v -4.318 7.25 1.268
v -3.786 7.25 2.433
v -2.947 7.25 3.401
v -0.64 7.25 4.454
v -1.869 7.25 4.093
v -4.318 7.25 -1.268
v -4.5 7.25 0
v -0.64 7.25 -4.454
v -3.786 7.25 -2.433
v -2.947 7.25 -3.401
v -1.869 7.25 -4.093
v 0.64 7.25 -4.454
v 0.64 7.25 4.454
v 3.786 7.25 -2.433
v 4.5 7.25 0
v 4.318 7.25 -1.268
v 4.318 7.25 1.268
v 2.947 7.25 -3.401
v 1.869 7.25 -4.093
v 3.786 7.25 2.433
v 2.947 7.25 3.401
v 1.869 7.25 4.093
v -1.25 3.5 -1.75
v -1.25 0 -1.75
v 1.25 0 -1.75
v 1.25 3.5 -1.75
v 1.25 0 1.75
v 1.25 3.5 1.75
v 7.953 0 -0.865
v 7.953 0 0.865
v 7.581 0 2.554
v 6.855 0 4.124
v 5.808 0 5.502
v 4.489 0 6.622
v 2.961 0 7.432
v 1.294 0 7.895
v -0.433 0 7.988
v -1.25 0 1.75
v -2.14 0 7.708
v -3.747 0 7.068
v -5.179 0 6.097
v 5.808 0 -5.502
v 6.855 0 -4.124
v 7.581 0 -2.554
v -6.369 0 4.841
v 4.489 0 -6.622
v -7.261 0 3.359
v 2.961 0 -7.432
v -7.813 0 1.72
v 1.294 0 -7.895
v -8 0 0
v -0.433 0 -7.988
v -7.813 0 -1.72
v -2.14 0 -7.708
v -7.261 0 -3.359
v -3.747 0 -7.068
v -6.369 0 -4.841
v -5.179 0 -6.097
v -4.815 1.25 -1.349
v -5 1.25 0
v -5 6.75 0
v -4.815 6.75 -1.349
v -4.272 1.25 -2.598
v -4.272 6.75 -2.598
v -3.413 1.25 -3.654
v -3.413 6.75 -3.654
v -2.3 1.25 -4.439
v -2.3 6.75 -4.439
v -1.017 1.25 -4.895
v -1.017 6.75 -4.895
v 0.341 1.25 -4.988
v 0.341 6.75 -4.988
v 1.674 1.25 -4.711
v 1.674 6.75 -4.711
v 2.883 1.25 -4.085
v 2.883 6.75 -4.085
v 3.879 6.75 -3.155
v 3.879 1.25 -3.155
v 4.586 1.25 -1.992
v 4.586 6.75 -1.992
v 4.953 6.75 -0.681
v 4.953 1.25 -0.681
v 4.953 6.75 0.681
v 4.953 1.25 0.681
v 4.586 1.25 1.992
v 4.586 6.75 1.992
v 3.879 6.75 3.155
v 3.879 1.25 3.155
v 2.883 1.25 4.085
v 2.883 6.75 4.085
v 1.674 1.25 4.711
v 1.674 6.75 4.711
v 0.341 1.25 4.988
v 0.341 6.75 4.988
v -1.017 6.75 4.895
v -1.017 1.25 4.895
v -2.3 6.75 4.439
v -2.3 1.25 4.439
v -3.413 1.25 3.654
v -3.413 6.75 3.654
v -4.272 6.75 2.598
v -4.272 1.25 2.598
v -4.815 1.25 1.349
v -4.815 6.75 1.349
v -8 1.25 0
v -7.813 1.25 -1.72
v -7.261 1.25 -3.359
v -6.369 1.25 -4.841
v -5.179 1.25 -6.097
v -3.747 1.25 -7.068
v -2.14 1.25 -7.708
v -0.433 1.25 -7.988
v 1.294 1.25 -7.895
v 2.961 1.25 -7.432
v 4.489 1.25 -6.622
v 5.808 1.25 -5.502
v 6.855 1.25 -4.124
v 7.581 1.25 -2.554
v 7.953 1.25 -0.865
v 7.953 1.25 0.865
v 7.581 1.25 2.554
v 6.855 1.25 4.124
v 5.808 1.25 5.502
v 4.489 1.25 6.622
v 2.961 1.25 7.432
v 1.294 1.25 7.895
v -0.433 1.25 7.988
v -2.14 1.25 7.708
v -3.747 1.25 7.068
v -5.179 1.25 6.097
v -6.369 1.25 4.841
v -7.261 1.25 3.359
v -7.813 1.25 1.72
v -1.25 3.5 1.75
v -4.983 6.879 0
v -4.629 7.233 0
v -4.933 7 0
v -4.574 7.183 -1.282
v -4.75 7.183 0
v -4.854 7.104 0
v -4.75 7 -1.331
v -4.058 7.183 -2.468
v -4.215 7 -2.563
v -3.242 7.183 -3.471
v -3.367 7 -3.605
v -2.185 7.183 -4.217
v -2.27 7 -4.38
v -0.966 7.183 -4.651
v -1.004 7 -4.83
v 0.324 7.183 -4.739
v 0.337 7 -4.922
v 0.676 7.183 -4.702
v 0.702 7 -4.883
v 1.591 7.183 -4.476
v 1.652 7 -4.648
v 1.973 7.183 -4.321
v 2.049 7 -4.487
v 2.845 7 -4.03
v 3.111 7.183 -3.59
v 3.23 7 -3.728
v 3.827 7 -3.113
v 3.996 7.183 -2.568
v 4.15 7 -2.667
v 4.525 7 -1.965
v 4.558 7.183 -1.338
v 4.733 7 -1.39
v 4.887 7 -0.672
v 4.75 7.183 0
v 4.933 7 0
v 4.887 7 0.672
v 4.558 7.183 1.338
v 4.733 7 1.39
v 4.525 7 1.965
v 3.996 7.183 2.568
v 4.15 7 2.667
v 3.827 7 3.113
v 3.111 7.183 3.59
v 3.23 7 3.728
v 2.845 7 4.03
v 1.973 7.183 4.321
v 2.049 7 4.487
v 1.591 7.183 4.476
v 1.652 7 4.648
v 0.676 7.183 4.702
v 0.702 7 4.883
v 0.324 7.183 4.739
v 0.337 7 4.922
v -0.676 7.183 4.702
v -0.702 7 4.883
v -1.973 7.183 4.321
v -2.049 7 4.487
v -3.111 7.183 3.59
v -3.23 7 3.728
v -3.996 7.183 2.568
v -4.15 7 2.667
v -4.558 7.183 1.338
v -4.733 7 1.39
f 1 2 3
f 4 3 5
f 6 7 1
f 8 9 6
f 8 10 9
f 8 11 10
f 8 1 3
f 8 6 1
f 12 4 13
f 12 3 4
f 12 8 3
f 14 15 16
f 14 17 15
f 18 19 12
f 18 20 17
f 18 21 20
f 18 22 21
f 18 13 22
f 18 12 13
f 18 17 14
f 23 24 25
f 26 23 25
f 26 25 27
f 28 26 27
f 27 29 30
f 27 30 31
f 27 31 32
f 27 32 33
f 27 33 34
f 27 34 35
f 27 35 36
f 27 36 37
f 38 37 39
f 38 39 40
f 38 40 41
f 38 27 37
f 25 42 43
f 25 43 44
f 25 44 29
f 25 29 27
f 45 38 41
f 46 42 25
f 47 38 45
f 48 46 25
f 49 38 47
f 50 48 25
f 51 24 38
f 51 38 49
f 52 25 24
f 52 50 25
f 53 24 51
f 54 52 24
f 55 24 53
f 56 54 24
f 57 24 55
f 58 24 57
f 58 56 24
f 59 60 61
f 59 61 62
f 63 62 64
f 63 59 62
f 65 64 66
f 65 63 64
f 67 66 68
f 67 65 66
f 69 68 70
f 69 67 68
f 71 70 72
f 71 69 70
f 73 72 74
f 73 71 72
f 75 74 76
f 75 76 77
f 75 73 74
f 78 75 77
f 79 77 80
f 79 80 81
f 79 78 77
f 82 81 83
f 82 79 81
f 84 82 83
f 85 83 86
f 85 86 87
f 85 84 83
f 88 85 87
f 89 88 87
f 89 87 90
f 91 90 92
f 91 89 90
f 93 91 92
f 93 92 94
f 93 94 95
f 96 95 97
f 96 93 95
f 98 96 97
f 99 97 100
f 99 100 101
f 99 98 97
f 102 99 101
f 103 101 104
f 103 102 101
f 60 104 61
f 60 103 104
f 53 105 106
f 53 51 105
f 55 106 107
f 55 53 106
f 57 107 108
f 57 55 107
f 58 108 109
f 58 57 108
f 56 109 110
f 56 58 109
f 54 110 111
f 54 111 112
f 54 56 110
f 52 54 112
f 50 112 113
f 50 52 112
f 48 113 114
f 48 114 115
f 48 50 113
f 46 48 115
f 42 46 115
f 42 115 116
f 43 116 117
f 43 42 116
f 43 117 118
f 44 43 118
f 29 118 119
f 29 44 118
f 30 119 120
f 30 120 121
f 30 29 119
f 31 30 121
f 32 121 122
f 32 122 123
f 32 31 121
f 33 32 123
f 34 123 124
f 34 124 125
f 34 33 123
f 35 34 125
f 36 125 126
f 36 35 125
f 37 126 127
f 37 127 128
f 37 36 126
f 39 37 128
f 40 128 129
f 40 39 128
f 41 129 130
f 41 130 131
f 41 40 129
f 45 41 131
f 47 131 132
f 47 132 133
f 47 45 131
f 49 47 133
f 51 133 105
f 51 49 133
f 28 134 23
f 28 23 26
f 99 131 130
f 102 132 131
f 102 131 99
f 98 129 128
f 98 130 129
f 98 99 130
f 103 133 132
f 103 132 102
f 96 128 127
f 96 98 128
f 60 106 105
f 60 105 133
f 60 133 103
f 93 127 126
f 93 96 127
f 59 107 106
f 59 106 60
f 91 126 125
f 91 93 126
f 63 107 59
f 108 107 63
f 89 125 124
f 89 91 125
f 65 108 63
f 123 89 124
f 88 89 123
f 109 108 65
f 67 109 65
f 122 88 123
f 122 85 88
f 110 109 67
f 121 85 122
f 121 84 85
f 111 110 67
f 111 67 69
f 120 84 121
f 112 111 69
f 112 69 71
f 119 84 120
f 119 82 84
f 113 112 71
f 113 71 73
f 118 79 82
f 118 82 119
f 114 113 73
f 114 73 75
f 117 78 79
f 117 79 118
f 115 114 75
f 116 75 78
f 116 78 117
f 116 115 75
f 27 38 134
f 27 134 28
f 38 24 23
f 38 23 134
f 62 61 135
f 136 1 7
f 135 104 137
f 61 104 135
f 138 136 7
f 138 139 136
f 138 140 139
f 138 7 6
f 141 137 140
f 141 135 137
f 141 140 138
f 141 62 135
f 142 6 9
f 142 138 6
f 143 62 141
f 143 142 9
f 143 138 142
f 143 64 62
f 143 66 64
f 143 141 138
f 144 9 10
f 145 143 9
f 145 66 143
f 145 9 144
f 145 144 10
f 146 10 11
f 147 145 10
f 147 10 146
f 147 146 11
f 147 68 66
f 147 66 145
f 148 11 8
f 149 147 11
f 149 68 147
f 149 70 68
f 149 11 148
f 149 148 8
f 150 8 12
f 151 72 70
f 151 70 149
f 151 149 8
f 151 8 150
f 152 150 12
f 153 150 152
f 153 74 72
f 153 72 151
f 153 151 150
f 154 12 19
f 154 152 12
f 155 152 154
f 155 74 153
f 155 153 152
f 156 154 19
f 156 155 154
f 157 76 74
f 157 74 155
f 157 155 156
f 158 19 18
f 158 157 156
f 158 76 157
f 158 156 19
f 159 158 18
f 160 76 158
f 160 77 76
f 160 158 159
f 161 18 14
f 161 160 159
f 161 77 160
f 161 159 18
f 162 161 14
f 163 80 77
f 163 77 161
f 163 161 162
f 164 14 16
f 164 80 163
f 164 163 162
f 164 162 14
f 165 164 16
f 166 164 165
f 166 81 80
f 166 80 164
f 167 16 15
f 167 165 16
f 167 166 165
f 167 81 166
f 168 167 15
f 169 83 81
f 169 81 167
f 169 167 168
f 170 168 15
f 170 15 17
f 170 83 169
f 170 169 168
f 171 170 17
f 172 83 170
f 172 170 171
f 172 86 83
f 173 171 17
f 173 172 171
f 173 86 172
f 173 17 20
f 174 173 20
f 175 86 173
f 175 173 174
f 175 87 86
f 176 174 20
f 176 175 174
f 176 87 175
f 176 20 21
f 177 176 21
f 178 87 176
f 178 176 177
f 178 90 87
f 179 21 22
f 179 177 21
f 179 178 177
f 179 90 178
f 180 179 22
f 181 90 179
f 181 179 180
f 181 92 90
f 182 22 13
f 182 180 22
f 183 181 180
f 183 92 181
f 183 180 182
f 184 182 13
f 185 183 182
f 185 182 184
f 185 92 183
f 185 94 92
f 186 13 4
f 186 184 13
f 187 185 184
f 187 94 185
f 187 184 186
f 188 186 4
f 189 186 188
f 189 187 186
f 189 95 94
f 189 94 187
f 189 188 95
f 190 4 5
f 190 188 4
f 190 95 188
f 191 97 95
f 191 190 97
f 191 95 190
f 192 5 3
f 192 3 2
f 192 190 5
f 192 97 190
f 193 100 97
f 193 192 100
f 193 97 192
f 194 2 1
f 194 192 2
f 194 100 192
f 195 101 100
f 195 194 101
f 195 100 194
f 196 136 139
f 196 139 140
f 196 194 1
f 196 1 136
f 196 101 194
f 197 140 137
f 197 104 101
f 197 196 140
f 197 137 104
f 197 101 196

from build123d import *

# Parameters (mm, degrees)
SKETCH2_W          = 2.5
SKETCH2_H          = 3.5
CUT_EXTRUDE1_DEPTH = 3.5
FILLET1_R          = 0.5


with BuildPart() as part:
    # Sketch1 → Revolve1 (revolve)
    with BuildSketch(Plane.XY, mode=Mode.PRIVATE) as revolve1_sk:
        Polygon((0, 7.25), (5, 7.25), (5, 1.25), (8, 1.25), (8, 0), (0, 0), align=None)
    revolve(revolve1_sk.sketch.rotate(Axis((0, 7.25, 0), (0, -1, 0)), 180), axis=Axis((0, 7.25, 0), (0, -1, 0)))

    # Sketch2 → Cut-Extrude1 (cut)
    with BuildSketch(Plane.XZ):
        Rectangle(SKETCH2_W, SKETCH2_H)
    extrude(amount=-CUT_EXTRUDE1_DEPTH, mode=Mode.SUBTRACT)

    # Fillet1
    fillet1_edges = [part.edges().sort_by_distance(p)[0] for p in [
        (5, 7.25, 0),
    ]]
    fillet(fillet1_edges, radius=FILLET1_R)


solid = part.part
